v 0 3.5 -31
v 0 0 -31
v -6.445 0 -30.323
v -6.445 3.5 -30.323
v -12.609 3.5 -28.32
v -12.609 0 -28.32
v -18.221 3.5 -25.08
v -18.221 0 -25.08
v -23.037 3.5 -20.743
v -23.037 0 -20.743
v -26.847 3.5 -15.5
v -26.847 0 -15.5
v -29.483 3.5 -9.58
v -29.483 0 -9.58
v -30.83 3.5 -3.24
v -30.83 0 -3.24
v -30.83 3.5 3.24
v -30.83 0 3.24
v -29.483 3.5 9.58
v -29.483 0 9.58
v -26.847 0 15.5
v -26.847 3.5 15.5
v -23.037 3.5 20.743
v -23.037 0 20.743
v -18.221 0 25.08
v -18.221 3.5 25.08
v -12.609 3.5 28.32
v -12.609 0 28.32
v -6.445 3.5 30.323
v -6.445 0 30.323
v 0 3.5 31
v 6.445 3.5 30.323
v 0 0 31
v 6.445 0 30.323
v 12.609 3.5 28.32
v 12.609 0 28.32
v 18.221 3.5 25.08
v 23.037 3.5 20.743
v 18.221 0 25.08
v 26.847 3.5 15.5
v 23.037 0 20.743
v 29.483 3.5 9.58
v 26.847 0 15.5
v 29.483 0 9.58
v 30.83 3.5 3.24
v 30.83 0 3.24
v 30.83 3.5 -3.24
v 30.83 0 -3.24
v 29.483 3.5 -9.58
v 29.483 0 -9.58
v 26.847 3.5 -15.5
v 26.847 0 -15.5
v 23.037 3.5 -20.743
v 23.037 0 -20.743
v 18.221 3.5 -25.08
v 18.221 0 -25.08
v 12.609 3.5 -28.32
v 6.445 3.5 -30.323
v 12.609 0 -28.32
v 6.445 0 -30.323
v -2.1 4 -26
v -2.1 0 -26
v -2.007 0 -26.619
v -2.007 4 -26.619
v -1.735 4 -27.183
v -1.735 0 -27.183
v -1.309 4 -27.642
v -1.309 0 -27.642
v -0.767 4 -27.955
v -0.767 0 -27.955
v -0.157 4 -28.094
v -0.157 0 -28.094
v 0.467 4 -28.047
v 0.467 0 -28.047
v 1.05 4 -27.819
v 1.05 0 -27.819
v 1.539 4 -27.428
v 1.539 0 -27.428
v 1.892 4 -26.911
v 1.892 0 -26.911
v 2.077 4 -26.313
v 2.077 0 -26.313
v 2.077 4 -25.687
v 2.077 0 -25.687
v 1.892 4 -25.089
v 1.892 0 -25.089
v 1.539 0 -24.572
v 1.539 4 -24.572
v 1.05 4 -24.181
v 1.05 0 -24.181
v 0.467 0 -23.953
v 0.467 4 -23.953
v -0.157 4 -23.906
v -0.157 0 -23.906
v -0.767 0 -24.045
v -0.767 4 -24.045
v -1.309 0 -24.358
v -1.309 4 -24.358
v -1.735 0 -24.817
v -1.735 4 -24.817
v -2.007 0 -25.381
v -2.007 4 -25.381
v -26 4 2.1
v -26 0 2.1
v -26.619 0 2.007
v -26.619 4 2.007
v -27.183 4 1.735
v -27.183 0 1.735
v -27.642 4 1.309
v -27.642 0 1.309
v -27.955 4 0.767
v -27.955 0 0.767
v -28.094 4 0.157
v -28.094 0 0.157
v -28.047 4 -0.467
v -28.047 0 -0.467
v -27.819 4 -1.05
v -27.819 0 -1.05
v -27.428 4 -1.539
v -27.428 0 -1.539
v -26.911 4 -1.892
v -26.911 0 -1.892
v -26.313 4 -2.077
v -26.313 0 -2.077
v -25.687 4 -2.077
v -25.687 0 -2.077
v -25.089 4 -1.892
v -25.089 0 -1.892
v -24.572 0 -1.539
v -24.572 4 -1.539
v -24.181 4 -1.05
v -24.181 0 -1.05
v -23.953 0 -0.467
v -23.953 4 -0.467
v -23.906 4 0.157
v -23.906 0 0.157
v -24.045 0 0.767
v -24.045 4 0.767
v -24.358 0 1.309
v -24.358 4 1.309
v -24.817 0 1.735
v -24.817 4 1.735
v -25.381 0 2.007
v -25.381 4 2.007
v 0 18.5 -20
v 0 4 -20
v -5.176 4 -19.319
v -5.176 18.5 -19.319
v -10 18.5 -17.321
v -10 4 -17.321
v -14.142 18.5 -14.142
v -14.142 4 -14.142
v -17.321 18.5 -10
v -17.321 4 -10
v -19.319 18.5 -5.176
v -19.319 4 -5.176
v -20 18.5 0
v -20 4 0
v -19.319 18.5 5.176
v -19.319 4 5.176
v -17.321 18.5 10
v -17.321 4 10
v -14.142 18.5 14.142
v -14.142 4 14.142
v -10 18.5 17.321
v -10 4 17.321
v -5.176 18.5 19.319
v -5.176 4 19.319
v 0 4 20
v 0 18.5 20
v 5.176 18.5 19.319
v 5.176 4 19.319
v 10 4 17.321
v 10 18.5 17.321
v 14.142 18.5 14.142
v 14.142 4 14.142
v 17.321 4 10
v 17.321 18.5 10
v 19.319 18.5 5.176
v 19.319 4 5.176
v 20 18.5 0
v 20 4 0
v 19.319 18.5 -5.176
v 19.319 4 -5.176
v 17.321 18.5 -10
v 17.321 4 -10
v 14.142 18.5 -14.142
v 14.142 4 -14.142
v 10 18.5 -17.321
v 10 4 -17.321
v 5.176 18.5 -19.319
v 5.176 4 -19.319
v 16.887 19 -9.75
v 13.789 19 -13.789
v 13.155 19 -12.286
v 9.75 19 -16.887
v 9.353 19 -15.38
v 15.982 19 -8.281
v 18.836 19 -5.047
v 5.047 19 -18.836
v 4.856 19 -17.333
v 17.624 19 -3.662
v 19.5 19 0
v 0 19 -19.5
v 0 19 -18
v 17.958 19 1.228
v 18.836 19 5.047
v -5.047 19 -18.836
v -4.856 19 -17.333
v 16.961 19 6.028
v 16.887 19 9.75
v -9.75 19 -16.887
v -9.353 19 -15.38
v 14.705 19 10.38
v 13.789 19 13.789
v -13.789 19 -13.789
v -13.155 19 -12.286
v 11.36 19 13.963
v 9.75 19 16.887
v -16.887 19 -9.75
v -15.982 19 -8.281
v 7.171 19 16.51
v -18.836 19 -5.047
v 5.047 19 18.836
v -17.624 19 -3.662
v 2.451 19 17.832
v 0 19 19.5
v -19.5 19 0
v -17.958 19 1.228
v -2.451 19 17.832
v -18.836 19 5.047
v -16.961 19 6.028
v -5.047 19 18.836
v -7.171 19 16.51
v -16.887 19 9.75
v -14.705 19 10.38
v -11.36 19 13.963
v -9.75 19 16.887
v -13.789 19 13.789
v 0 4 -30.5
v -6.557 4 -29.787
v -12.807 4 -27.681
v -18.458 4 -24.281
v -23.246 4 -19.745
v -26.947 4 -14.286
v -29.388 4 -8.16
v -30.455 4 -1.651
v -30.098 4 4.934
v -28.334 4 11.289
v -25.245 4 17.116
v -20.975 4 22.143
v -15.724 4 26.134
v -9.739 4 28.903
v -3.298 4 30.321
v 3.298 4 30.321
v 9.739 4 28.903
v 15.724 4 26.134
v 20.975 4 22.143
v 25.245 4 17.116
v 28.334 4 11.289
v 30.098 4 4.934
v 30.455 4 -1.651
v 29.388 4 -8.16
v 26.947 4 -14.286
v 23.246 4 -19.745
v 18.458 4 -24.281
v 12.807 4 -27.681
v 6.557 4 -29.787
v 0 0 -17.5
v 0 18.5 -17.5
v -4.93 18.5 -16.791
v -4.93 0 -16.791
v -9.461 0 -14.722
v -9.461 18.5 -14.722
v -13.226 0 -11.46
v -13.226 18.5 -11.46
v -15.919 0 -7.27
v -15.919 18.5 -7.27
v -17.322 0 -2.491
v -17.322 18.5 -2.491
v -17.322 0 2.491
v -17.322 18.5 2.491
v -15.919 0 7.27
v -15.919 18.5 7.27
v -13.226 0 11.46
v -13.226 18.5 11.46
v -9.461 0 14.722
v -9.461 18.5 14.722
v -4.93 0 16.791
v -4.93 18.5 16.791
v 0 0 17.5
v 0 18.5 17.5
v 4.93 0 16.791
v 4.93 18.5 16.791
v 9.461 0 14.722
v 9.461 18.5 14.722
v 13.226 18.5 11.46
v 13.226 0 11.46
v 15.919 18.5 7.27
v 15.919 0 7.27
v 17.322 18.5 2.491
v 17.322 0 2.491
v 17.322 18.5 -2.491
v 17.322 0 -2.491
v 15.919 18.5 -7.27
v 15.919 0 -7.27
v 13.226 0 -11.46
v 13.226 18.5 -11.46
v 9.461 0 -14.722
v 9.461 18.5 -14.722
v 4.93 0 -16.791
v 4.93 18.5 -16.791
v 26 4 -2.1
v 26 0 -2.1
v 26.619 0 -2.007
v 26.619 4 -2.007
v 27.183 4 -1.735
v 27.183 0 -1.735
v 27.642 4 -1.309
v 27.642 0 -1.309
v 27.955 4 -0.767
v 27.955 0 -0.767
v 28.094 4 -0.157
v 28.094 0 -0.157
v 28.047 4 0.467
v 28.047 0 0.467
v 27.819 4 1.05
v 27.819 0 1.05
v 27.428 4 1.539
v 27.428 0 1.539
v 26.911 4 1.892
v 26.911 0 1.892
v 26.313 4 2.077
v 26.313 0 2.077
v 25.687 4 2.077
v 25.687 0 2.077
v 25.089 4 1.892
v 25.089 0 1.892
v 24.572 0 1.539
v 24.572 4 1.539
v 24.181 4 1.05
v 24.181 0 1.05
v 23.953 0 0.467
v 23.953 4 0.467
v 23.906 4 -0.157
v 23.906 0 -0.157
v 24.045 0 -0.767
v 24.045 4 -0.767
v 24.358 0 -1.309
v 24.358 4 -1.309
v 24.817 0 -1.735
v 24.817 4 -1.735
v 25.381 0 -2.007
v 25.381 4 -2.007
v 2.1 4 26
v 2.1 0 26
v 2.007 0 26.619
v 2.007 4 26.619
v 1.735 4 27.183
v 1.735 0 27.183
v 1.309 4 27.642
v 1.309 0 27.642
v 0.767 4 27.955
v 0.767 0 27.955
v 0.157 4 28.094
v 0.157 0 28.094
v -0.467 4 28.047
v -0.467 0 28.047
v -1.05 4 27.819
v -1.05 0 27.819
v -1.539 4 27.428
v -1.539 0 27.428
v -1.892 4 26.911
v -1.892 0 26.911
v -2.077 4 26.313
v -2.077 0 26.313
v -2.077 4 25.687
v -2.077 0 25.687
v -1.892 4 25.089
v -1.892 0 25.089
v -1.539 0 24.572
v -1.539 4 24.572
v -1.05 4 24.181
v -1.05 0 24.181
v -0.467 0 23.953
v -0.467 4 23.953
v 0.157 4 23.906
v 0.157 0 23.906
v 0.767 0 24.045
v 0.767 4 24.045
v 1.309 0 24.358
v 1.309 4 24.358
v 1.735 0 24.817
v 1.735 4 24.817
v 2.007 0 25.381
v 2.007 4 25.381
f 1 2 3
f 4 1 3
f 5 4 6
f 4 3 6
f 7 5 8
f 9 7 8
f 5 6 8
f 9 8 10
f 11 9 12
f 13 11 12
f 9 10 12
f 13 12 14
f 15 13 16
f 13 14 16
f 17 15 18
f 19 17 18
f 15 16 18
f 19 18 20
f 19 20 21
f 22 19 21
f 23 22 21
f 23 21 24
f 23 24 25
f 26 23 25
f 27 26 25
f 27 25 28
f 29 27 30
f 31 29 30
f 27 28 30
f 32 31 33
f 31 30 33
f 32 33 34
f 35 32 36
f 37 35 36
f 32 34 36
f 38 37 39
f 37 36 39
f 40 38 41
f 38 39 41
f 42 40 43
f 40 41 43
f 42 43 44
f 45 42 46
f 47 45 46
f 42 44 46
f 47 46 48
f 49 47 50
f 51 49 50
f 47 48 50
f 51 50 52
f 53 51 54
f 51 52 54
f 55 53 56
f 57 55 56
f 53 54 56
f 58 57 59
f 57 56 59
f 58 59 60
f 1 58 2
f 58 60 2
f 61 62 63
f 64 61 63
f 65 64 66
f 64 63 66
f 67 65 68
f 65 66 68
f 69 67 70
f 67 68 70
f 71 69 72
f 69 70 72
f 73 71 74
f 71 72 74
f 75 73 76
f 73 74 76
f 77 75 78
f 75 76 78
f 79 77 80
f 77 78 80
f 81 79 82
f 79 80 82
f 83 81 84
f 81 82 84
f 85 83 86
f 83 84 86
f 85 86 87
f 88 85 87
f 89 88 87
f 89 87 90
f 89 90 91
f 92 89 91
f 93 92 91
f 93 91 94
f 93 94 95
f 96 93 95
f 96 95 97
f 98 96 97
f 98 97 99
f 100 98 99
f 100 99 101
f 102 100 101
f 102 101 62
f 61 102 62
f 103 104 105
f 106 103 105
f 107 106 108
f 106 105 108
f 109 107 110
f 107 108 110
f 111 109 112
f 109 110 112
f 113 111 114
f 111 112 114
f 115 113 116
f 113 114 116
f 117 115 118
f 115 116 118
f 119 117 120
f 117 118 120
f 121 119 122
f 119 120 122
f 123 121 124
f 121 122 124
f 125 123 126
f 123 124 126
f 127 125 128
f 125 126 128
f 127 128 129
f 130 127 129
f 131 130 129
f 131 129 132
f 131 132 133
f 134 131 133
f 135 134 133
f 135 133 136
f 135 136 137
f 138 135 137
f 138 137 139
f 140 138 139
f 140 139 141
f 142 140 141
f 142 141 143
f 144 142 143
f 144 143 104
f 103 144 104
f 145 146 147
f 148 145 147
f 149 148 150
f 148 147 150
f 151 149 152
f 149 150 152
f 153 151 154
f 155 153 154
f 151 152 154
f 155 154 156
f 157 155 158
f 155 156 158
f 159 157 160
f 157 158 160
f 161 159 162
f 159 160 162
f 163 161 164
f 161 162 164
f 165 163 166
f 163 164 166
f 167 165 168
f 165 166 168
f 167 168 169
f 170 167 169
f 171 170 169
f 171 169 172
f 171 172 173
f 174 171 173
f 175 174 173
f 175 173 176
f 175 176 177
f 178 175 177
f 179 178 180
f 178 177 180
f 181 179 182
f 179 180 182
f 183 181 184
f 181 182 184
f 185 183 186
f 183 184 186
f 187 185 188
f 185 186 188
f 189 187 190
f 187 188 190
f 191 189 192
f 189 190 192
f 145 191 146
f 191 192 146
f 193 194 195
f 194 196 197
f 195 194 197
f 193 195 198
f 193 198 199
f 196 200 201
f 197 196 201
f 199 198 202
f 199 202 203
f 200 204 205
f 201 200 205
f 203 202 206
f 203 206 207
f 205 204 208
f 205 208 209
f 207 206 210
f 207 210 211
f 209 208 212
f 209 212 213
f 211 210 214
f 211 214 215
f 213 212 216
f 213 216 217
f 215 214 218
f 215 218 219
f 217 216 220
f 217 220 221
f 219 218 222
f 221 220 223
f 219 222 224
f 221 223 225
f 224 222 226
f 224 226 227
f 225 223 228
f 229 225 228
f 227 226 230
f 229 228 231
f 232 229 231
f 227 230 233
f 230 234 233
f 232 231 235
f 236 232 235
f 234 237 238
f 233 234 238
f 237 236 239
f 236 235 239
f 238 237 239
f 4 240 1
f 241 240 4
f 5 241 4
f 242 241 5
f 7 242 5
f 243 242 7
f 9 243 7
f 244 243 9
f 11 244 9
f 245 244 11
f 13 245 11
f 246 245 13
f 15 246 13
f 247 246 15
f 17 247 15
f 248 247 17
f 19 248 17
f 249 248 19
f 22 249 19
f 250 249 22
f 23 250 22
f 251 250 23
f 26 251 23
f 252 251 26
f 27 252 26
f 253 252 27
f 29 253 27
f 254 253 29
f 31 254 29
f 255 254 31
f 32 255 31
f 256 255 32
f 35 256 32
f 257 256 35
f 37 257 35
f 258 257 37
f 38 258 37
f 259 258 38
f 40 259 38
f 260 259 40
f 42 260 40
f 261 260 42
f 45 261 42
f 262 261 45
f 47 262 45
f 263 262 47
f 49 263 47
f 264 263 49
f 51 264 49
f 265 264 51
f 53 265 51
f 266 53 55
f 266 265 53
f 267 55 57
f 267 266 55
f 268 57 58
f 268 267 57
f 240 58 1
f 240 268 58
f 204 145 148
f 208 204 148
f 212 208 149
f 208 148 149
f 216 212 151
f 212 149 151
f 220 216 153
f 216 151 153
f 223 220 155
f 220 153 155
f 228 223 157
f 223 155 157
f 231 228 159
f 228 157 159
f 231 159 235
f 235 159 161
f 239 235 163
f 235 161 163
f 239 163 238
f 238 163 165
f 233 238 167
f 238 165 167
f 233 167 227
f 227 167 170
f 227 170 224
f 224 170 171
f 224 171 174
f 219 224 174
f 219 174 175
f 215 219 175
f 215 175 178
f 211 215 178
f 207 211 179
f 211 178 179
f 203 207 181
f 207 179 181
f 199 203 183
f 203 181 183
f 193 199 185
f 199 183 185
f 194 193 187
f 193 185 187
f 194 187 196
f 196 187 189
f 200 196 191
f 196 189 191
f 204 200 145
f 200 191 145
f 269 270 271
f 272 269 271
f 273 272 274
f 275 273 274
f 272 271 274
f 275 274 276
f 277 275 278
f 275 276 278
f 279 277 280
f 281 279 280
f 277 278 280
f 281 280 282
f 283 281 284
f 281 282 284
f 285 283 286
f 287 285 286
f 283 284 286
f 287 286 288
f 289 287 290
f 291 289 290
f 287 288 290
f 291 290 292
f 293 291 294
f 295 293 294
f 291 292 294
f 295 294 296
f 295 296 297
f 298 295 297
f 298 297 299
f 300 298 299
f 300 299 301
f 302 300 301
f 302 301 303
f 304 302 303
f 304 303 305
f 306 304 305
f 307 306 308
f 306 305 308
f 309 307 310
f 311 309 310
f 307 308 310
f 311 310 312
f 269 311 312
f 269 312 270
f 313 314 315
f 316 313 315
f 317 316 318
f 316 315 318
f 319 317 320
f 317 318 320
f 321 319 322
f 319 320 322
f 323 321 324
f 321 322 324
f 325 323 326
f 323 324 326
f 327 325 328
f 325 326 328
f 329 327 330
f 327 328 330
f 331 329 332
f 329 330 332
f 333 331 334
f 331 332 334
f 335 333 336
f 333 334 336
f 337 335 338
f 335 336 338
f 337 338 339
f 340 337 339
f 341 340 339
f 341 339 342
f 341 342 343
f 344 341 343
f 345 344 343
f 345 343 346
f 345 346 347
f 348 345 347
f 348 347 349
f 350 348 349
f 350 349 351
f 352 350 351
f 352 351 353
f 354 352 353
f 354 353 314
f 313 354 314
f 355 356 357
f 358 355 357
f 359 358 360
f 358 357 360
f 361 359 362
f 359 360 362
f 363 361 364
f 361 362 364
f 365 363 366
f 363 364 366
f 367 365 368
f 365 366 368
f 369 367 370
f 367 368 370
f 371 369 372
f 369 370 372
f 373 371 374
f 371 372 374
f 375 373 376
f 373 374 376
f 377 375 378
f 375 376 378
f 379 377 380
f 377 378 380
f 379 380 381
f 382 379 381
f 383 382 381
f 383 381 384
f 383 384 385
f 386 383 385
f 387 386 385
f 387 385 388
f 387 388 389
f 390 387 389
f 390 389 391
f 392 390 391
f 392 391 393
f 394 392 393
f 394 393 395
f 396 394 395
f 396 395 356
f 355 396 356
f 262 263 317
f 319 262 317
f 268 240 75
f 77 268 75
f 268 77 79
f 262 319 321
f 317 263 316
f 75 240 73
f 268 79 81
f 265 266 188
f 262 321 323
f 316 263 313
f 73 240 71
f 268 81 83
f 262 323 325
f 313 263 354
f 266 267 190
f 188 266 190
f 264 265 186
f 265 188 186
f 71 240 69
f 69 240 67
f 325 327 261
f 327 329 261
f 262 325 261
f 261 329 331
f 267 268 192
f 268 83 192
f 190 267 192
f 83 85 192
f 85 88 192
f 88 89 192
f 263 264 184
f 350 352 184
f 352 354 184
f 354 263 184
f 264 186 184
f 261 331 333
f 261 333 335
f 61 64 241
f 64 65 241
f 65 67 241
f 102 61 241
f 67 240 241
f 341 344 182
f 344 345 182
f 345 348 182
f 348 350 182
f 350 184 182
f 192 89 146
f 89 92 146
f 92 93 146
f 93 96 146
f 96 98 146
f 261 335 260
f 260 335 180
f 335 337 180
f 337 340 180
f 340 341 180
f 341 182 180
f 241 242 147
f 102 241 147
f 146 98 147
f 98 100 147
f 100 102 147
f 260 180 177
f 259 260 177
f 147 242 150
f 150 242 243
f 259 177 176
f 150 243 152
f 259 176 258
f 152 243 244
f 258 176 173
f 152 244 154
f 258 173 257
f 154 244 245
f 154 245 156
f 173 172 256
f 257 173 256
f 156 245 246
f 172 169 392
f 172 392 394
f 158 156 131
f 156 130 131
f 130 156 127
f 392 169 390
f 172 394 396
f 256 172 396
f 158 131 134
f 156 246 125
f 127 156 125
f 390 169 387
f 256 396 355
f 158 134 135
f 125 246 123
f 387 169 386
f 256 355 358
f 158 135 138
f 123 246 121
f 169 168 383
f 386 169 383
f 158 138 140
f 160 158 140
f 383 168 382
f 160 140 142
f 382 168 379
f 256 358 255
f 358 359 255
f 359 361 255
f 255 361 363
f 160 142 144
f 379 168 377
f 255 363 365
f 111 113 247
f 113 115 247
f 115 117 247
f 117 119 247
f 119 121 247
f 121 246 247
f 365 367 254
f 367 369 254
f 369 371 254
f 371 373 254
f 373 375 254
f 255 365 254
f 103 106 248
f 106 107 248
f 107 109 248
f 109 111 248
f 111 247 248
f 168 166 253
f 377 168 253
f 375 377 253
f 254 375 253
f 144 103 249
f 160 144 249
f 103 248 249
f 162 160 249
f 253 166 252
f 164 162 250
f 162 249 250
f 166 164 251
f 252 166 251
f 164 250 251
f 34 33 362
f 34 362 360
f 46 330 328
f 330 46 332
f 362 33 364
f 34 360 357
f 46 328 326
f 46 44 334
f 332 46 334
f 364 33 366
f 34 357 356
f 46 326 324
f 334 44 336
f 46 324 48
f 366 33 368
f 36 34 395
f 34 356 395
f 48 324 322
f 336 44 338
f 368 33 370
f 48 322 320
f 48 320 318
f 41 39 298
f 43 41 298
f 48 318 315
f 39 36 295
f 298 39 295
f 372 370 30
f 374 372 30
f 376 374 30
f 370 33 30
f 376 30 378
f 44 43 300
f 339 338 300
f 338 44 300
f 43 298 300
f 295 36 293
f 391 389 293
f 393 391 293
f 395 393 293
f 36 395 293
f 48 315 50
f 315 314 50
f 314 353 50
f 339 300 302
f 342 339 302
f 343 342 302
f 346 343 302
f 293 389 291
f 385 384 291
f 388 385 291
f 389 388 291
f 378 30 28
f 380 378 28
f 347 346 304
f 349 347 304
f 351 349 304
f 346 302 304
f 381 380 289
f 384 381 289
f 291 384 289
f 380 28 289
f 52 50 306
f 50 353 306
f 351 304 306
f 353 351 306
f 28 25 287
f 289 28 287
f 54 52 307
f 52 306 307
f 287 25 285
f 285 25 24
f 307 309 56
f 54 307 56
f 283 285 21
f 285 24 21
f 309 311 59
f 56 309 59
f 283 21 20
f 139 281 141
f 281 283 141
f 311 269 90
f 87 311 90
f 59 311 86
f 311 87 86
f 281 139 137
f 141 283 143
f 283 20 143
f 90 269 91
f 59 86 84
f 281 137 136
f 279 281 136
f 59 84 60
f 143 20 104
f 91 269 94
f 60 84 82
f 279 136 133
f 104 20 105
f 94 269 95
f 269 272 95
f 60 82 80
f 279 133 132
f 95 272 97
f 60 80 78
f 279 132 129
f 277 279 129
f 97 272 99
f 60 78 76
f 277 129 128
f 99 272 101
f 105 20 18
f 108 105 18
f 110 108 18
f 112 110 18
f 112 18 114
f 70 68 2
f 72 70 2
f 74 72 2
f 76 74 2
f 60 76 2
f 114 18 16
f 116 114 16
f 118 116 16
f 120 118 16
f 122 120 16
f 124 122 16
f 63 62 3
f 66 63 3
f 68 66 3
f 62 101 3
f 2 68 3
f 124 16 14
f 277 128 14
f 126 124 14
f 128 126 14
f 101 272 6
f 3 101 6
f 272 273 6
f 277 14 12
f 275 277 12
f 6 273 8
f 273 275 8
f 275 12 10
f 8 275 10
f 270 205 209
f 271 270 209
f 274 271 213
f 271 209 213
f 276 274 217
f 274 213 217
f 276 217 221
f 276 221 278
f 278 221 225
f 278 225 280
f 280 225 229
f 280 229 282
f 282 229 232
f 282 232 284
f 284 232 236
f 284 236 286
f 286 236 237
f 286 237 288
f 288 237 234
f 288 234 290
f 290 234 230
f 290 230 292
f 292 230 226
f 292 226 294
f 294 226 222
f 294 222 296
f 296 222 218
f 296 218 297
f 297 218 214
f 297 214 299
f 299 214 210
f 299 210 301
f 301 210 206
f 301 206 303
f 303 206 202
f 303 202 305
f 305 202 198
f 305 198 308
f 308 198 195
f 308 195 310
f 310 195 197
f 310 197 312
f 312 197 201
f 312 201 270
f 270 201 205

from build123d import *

# Parameters (mm, degrees)
TAP_DRILL_FOR_M5_TAP1_D = 4.2
CIRPATTERN1_COUNT       = 4
CHAMFER1_SIZE           = 0.5
CHAMFER2_SIZE           = 0.5


with BuildPart() as part:
    # Sketch1 → Revolve1 (revolve)
    with BuildSketch(Plane.XY, mode=Mode.PRIVATE) as revolve1_sk:
        Polygon((-31, 0), (-17.5, 0), (-17.5, 19), (-20, 19), (-20, 4), (-31, 4), align=None)
    revolve(revolve1_sk.sketch.rotate(Axis((0, 0, 0), (0, 1, 0)), 270), axis=Axis((0, 0, 0), (0, 1, 0)))

    # Tap Drill for M5 Tap1 (through all)
    with Locations(Plane(origin=(0, 4, 0), x_dir=(1, 0, 0), z_dir=(0, 1, 0))):
        with Locations((0, 26)):
            tap_drill_for_m5_tap1 = Hole(TAP_DRILL_FOR_M5_TAP1_D / 2)

    # CirPattern1: Tap Drill for M5 Tap1 ×4 about axis
    cirpattern1_axis = Axis((0, 0, 0), (0, 1, 0))
    for i in range(1, CIRPATTERN1_COUNT):
        add(tap_drill_for_m5_tap1.rotate(cirpattern1_axis, i * 360 / CIRPATTERN1_COUNT), mode=Mode.SUBTRACT)

    # Chamfer1
    chamfer1_edges = [part.edges().sort_by_distance(p)[0] for p in [
        (0, 19, 20),
        (0, 19, 17.5),
    ]]
    chamfer(chamfer1_edges, length=CHAMFER1_SIZE)

    # Chamfer2
    chamfer2_edges = [part.edges().sort_by_distance(p)[0] for p in [
        (0, 4, 31),
    ]]
    chamfer(chamfer2_edges, length=CHAMFER2_SIZE)


solid = part.part
